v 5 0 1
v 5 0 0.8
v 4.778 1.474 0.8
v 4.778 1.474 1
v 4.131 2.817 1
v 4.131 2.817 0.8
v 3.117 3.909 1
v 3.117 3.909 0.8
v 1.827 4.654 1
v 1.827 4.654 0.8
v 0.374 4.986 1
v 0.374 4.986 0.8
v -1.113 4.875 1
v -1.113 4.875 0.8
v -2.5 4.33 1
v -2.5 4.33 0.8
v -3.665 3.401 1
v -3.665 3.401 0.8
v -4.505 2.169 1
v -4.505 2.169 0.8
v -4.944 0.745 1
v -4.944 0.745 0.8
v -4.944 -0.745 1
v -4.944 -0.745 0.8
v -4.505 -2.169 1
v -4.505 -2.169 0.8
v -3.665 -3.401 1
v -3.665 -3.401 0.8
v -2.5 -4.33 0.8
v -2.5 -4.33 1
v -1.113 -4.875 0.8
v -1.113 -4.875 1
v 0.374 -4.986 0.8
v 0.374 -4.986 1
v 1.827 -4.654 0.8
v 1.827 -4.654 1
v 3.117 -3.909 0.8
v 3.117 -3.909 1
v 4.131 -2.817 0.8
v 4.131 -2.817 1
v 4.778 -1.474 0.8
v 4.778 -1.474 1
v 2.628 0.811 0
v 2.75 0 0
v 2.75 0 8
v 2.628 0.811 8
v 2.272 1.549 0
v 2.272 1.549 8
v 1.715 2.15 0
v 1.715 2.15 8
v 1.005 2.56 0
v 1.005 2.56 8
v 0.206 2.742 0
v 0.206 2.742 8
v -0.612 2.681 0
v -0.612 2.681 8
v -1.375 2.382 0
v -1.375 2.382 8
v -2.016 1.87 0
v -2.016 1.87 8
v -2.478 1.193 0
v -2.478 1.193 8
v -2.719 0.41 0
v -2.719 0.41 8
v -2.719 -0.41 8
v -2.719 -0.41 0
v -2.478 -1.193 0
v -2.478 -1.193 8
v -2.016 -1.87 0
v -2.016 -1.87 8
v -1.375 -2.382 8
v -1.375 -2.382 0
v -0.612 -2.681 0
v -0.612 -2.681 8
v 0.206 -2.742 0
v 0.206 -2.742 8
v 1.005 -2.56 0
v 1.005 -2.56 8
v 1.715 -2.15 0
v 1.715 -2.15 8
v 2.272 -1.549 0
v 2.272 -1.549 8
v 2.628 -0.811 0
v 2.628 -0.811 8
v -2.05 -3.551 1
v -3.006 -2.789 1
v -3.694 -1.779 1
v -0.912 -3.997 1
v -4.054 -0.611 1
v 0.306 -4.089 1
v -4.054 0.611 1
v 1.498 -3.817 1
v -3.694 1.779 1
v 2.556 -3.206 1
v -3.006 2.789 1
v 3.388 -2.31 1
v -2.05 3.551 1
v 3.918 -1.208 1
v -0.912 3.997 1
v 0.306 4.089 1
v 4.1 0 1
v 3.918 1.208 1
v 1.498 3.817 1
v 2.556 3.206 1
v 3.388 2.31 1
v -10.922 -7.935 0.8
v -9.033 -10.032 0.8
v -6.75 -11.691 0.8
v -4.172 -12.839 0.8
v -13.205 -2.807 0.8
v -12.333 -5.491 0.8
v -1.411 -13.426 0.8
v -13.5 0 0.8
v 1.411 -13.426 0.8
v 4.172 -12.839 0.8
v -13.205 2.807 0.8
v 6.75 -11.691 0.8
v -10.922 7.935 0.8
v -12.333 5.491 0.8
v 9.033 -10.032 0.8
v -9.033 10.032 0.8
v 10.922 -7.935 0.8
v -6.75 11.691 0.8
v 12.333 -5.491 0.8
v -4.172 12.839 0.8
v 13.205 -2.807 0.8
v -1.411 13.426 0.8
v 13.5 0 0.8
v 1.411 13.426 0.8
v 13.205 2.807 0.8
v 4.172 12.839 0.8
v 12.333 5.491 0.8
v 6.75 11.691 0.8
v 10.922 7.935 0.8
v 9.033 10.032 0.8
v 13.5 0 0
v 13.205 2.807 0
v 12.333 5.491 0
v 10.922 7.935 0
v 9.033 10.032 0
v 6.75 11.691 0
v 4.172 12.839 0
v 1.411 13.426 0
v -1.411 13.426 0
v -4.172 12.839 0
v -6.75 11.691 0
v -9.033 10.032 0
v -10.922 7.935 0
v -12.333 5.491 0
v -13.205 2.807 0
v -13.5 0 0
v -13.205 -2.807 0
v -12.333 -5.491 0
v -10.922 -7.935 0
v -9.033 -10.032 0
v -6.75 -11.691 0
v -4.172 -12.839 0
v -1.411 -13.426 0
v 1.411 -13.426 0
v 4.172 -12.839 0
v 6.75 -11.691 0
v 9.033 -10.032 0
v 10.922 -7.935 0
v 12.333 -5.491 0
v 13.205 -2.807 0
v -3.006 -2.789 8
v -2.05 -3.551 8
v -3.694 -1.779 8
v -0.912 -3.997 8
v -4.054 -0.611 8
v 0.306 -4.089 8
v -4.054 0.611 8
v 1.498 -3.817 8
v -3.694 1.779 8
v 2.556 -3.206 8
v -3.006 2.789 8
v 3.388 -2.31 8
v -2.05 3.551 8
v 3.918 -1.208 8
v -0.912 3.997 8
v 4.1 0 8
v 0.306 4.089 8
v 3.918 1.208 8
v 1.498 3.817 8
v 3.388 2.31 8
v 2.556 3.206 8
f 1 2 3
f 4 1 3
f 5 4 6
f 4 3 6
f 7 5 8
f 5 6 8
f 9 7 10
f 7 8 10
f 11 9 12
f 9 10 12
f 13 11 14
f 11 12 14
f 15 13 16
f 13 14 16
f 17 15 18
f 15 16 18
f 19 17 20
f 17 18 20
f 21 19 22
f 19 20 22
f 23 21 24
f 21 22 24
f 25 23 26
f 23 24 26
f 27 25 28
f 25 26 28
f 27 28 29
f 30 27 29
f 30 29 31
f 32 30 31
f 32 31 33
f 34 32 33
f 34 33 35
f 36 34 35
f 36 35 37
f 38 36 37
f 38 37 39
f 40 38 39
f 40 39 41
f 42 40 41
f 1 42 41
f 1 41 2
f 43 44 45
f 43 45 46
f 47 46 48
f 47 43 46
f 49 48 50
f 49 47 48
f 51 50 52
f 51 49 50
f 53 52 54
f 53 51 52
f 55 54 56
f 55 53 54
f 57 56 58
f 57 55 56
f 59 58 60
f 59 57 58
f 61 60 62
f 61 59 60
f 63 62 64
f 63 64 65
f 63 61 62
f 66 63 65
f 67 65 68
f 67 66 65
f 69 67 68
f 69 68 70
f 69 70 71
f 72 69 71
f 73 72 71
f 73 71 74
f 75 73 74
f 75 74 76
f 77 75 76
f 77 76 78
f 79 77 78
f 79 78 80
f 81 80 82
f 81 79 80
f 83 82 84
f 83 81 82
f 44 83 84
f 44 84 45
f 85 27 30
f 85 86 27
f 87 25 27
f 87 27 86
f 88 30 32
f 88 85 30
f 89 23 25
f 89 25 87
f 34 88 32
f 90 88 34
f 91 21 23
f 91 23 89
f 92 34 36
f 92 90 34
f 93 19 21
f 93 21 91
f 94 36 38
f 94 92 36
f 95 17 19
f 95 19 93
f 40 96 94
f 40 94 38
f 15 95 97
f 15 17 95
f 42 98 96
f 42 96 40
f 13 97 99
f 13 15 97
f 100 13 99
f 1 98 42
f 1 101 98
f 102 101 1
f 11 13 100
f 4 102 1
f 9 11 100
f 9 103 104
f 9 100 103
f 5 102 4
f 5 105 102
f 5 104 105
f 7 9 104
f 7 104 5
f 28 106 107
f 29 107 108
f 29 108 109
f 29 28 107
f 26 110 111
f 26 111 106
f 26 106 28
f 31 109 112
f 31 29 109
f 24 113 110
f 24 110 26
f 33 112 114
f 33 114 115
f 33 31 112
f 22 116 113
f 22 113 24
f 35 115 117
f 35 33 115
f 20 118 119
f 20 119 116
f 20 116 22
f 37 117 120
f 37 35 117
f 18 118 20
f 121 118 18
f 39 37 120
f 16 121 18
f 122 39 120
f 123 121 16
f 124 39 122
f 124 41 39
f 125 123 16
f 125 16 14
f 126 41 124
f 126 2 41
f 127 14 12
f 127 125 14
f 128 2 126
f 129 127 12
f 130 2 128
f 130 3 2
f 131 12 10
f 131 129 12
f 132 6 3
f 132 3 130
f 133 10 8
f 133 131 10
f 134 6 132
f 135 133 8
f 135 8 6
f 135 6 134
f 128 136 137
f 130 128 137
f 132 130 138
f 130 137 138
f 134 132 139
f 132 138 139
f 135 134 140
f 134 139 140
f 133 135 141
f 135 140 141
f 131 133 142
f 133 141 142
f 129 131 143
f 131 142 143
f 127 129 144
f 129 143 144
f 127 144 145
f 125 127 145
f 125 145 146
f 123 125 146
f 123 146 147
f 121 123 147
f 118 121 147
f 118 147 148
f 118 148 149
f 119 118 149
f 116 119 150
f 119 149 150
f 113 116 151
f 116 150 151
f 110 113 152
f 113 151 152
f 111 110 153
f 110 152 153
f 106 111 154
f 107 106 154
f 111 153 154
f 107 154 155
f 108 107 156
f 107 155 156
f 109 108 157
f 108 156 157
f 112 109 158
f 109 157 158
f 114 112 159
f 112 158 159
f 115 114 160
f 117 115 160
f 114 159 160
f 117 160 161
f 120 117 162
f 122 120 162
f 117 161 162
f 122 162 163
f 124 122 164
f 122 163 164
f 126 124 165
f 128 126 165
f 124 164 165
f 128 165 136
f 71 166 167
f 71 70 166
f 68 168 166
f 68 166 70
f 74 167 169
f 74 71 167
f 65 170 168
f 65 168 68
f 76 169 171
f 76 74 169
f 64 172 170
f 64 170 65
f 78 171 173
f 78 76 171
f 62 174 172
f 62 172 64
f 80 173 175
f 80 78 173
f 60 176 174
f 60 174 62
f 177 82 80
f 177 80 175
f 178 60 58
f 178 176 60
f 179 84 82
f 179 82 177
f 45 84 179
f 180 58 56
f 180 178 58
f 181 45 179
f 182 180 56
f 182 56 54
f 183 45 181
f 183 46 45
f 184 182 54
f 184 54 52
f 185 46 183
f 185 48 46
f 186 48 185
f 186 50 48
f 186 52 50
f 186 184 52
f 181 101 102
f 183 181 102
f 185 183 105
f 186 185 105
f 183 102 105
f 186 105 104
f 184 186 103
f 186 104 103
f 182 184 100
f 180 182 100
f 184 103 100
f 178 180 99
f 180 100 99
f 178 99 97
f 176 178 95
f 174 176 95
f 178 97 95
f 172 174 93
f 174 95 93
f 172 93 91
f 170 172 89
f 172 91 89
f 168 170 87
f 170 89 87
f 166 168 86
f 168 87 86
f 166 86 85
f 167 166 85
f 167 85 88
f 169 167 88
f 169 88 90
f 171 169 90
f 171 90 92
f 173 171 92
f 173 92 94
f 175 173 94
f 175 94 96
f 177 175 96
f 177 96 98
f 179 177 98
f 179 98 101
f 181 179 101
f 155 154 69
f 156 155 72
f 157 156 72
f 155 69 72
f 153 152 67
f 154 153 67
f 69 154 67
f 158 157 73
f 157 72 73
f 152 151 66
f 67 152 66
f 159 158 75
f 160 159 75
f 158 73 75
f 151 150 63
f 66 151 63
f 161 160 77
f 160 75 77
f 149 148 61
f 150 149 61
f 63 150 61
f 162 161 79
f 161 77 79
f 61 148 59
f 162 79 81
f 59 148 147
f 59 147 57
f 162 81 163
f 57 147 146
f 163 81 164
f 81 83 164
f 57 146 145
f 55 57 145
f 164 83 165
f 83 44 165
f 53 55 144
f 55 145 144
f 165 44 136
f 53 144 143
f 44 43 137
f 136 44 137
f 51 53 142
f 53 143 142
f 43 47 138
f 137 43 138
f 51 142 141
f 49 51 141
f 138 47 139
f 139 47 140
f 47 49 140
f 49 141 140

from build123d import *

# Parameters (mm, degrees)
F0_R     = 13.5
F0_R_2   = 5
F1_DEPTH = 0.8
F0_R_3   = 4.1
F0_R_4   = 2.75
F2_DEPTH = 8
F3_DEPTH = 1


with BuildPart() as f1:
    # F0 (on Top) → F1 (new body)
    with BuildSketch(Plane.XY):
        Circle(F0_R)
        Circle(F0_R_2, mode=Mode.SUBTRACT)
    extrude(amount=F1_DEPTH)



with BuildPart() as f2:
    # F0 (on Top) → F2 (new body)
    with BuildSketch(Plane.XY):
        Circle(F0_R_3)
        Circle(F0_R_4, mode=Mode.SUBTRACT)
    extrude(amount=F2_DEPTH)


with BuildPart() as f1_1:
    add(f1.part)

    add(f2.part)  # F3 merges F2
    # F0 (on Top) → F3 (join)
    with BuildSketch(Plane.XY):
        Circle(F0_R_2)
        Circle(F0_R_3, mode=Mode.SUBTRACT)
    extrude(amount=F3_DEPTH)


solid = f1_1.part
